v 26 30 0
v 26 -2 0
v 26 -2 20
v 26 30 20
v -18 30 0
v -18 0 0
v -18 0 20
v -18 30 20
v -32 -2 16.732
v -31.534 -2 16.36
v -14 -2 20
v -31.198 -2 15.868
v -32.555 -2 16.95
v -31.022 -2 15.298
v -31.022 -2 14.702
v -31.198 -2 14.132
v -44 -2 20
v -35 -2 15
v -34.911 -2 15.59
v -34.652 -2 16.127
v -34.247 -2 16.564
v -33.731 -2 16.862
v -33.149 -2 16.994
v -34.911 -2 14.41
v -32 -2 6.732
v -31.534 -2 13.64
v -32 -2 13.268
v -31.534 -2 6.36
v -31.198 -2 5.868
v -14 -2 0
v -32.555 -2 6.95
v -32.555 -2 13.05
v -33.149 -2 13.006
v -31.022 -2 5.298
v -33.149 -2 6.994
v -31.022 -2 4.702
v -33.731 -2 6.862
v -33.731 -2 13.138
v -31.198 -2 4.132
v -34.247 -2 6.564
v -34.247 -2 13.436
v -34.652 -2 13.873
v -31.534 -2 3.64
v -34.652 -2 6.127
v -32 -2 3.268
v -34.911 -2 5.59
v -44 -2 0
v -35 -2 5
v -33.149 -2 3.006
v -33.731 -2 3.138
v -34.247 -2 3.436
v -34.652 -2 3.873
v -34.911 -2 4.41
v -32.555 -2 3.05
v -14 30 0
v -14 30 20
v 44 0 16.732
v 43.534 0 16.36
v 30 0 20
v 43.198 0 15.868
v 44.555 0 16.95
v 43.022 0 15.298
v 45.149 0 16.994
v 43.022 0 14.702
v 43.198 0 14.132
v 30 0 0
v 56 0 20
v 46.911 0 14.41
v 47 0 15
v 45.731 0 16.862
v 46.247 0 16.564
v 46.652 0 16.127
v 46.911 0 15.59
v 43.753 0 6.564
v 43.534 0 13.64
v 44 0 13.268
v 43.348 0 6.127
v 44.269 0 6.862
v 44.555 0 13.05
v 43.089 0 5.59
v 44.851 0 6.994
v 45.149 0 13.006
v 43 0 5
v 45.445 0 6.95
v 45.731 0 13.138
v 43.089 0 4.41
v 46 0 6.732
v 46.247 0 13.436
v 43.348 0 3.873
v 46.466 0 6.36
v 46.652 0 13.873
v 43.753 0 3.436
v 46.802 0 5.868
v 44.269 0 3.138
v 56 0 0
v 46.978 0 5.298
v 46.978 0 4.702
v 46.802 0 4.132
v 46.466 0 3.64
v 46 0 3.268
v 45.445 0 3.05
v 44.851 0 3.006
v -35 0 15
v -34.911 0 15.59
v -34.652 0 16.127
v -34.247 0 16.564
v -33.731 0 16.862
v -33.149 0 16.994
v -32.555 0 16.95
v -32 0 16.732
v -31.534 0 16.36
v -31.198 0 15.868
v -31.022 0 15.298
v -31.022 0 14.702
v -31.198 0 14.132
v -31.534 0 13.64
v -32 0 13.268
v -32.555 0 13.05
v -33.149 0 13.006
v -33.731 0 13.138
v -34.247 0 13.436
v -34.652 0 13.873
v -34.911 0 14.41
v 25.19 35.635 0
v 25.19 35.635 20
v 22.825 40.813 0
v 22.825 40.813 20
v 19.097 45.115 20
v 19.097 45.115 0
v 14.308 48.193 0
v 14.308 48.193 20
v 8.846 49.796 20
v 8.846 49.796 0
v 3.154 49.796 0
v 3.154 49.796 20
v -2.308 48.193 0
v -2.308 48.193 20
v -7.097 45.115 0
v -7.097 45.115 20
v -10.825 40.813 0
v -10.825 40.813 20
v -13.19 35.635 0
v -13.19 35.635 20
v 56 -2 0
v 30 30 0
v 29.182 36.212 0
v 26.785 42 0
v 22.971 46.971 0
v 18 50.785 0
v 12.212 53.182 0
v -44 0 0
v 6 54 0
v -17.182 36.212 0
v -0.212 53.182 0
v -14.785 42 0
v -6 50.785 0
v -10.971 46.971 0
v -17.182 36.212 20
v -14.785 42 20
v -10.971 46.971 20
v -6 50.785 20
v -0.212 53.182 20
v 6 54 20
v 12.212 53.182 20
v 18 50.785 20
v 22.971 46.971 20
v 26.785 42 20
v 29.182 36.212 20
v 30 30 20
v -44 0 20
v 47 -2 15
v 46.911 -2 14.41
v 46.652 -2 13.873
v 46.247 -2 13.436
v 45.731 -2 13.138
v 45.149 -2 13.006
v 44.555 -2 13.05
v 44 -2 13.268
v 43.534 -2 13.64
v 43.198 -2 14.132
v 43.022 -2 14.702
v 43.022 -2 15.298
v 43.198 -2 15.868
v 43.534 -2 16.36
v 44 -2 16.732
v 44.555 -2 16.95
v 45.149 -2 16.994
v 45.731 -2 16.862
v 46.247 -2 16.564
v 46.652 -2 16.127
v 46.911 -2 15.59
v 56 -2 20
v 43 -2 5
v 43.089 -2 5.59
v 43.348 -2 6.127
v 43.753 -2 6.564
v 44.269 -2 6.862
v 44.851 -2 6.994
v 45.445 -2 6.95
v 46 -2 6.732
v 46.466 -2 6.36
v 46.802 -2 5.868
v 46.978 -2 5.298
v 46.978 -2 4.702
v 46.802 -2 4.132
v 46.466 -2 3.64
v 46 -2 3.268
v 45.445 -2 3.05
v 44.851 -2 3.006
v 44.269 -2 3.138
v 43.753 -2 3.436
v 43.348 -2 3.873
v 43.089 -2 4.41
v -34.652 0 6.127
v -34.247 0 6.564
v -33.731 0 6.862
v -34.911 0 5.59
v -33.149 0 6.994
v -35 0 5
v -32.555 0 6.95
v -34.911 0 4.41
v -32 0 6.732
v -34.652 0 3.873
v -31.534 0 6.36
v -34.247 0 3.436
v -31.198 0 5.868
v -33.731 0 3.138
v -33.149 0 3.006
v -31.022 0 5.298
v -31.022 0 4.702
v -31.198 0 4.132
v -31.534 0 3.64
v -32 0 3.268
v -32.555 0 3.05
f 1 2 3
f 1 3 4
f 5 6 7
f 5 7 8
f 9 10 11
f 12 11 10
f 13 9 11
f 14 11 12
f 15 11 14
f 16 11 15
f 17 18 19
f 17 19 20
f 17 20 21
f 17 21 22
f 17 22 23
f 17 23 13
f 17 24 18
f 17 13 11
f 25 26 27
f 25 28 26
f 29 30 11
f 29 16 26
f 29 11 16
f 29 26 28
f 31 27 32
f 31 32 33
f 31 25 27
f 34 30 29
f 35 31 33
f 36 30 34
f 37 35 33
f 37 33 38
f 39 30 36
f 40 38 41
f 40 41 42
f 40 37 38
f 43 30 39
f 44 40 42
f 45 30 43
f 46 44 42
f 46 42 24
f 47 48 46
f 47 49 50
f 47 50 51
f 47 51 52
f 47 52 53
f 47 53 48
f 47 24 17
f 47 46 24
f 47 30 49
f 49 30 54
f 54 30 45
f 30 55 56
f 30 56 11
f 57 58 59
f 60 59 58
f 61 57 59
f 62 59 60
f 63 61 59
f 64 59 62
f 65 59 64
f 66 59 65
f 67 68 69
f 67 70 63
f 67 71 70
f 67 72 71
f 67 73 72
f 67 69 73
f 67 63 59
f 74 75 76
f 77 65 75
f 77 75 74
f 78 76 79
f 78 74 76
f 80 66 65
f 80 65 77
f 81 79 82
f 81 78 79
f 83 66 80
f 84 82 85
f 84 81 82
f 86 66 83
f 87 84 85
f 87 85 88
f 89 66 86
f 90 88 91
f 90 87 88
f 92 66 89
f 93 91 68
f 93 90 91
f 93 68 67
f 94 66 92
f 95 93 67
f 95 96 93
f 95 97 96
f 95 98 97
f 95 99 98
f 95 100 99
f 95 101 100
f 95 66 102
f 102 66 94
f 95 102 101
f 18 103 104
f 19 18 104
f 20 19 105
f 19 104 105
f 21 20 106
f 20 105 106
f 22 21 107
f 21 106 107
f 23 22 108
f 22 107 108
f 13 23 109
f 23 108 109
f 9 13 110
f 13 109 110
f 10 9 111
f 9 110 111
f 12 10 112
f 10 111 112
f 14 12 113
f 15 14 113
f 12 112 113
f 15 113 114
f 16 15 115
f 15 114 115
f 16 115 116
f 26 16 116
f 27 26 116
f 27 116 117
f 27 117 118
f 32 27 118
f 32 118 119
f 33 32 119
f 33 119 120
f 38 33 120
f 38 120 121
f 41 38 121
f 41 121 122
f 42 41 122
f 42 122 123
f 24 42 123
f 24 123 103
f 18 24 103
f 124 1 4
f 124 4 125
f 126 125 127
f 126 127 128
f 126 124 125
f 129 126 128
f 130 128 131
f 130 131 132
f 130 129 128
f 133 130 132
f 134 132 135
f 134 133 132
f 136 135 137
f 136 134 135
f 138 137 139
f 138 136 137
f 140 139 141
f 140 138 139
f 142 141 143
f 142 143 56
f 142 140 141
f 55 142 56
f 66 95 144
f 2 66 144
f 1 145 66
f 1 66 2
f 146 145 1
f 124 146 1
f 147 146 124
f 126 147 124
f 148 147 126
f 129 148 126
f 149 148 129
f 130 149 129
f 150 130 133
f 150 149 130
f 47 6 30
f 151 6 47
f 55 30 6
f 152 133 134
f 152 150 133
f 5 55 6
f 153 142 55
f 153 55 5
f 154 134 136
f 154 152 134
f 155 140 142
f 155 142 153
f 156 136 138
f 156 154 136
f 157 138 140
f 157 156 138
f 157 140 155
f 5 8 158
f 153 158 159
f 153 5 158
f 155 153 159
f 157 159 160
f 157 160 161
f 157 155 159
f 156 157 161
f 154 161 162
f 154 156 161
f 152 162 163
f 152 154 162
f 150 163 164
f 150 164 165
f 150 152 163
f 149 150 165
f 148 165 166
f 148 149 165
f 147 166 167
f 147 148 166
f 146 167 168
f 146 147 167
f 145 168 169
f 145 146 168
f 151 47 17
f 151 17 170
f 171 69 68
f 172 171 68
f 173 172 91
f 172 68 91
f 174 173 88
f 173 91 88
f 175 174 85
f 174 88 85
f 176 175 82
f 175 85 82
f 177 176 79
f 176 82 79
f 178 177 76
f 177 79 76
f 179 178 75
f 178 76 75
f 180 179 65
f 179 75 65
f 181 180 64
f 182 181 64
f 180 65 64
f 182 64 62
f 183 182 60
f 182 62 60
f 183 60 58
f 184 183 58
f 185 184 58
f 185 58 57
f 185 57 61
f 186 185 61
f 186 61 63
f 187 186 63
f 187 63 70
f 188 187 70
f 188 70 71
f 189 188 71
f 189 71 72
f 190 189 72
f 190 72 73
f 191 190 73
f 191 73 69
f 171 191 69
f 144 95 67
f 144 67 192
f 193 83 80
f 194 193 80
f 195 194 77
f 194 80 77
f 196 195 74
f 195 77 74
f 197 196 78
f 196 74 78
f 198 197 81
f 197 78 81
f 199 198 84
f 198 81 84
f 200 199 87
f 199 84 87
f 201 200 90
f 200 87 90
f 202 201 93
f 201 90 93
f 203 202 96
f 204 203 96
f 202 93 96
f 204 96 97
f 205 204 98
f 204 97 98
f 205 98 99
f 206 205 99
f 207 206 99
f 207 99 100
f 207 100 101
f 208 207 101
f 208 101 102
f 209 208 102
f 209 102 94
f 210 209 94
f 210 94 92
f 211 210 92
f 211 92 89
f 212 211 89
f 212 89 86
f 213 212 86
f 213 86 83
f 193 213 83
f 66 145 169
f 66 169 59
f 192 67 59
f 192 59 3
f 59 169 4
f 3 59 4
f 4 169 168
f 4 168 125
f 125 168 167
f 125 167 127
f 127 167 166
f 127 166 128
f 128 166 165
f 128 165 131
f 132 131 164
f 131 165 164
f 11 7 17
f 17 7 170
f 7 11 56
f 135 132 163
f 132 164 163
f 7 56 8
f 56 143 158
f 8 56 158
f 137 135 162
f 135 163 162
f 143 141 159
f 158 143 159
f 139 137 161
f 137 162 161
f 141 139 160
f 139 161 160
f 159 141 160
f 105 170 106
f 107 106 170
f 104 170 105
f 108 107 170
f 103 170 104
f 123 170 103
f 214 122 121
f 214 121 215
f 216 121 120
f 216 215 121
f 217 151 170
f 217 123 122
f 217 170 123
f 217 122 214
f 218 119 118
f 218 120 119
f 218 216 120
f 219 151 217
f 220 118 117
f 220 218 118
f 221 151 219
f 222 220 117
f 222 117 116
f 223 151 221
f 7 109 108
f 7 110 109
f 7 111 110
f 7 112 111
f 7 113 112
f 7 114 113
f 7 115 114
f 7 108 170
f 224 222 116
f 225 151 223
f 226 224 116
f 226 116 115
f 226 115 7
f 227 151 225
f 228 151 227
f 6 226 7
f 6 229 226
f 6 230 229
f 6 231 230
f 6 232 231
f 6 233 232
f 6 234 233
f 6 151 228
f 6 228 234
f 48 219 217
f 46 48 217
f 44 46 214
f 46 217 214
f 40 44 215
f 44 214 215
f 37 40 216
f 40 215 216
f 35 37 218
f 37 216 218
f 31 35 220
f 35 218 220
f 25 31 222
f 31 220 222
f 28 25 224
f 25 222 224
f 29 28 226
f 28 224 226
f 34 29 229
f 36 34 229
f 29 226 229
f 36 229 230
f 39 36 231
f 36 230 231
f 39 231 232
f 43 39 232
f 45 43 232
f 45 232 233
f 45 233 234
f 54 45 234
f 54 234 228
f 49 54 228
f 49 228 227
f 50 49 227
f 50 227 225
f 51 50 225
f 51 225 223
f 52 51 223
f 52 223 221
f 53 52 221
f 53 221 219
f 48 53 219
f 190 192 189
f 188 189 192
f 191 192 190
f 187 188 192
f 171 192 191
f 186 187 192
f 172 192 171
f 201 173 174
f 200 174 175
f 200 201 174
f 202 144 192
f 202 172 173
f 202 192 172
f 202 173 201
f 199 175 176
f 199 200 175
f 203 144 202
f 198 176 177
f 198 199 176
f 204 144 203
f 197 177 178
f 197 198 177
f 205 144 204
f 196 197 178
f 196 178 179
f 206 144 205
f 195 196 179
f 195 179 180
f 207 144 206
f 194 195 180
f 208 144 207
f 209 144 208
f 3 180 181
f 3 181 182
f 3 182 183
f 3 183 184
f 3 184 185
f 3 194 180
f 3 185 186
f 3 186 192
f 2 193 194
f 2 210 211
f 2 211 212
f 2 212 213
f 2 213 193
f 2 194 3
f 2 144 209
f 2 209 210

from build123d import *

# Parameters (mm, degrees)
BOSS_EXTRUDE1_DEPTH = 20
SKETCH2_R           = 2
CUT_EXTRUDE1_DEPTH  = 81.324342512


with BuildPart() as part:
    # Sketch1 → Boss-Extrude1 (new body)
    with BuildSketch(Plane.XY):
        with BuildLine():
            Line((-18, 0), (-18, 30))
            ThreePointArc((-18, 30), (6, 54), (30, 30))
            Line((30, 30), (30, 0))
            Line((30, 0), (56, 0))
            Line((56, 0), (56, -2))
            Line((56, -2), (26, -2))
            Line((26, -2), (26, 0))
            Line((26, 0), (26, 30))
            ThreePointArc((26, 30), (6, 50), (-14, 30))
            Line((-14, 30), (-14, 0))
            Line((-14, 0), (-14, -2))
            Line((-14, -2), (-44, -2))
            Line((-44, -2), (-44, 0))
            Line((-44, 0), (-18, 0))
        make_face()
    extrude(amount=BOSS_EXTRUDE1_DEPTH)

    # Sketch2 → Cut-Extrude1 (cut, through all)
    with BuildSketch(Plane(origin=(0, 0, 0), x_dir=(1, 0, 0), z_dir=(0, 1, 0))):
        with Locations(Location((-33, -5, 0), (0, 0, 180))):
            Circle(SKETCH2_R)
        with Locations(Location((-33, -15, 0), (0, 0, 180))):
            Circle(SKETCH2_R)
        with Locations(Location((45, -5, 0), (0, 0, 180))):
            Circle(SKETCH2_R)
        with Locations((45, -15)):
            Circle(SKETCH2_R)
    extrude(amount=-CUT_EXTRUDE1_DEPTH, mode=Mode.SUBTRACT)


solid = part.part
